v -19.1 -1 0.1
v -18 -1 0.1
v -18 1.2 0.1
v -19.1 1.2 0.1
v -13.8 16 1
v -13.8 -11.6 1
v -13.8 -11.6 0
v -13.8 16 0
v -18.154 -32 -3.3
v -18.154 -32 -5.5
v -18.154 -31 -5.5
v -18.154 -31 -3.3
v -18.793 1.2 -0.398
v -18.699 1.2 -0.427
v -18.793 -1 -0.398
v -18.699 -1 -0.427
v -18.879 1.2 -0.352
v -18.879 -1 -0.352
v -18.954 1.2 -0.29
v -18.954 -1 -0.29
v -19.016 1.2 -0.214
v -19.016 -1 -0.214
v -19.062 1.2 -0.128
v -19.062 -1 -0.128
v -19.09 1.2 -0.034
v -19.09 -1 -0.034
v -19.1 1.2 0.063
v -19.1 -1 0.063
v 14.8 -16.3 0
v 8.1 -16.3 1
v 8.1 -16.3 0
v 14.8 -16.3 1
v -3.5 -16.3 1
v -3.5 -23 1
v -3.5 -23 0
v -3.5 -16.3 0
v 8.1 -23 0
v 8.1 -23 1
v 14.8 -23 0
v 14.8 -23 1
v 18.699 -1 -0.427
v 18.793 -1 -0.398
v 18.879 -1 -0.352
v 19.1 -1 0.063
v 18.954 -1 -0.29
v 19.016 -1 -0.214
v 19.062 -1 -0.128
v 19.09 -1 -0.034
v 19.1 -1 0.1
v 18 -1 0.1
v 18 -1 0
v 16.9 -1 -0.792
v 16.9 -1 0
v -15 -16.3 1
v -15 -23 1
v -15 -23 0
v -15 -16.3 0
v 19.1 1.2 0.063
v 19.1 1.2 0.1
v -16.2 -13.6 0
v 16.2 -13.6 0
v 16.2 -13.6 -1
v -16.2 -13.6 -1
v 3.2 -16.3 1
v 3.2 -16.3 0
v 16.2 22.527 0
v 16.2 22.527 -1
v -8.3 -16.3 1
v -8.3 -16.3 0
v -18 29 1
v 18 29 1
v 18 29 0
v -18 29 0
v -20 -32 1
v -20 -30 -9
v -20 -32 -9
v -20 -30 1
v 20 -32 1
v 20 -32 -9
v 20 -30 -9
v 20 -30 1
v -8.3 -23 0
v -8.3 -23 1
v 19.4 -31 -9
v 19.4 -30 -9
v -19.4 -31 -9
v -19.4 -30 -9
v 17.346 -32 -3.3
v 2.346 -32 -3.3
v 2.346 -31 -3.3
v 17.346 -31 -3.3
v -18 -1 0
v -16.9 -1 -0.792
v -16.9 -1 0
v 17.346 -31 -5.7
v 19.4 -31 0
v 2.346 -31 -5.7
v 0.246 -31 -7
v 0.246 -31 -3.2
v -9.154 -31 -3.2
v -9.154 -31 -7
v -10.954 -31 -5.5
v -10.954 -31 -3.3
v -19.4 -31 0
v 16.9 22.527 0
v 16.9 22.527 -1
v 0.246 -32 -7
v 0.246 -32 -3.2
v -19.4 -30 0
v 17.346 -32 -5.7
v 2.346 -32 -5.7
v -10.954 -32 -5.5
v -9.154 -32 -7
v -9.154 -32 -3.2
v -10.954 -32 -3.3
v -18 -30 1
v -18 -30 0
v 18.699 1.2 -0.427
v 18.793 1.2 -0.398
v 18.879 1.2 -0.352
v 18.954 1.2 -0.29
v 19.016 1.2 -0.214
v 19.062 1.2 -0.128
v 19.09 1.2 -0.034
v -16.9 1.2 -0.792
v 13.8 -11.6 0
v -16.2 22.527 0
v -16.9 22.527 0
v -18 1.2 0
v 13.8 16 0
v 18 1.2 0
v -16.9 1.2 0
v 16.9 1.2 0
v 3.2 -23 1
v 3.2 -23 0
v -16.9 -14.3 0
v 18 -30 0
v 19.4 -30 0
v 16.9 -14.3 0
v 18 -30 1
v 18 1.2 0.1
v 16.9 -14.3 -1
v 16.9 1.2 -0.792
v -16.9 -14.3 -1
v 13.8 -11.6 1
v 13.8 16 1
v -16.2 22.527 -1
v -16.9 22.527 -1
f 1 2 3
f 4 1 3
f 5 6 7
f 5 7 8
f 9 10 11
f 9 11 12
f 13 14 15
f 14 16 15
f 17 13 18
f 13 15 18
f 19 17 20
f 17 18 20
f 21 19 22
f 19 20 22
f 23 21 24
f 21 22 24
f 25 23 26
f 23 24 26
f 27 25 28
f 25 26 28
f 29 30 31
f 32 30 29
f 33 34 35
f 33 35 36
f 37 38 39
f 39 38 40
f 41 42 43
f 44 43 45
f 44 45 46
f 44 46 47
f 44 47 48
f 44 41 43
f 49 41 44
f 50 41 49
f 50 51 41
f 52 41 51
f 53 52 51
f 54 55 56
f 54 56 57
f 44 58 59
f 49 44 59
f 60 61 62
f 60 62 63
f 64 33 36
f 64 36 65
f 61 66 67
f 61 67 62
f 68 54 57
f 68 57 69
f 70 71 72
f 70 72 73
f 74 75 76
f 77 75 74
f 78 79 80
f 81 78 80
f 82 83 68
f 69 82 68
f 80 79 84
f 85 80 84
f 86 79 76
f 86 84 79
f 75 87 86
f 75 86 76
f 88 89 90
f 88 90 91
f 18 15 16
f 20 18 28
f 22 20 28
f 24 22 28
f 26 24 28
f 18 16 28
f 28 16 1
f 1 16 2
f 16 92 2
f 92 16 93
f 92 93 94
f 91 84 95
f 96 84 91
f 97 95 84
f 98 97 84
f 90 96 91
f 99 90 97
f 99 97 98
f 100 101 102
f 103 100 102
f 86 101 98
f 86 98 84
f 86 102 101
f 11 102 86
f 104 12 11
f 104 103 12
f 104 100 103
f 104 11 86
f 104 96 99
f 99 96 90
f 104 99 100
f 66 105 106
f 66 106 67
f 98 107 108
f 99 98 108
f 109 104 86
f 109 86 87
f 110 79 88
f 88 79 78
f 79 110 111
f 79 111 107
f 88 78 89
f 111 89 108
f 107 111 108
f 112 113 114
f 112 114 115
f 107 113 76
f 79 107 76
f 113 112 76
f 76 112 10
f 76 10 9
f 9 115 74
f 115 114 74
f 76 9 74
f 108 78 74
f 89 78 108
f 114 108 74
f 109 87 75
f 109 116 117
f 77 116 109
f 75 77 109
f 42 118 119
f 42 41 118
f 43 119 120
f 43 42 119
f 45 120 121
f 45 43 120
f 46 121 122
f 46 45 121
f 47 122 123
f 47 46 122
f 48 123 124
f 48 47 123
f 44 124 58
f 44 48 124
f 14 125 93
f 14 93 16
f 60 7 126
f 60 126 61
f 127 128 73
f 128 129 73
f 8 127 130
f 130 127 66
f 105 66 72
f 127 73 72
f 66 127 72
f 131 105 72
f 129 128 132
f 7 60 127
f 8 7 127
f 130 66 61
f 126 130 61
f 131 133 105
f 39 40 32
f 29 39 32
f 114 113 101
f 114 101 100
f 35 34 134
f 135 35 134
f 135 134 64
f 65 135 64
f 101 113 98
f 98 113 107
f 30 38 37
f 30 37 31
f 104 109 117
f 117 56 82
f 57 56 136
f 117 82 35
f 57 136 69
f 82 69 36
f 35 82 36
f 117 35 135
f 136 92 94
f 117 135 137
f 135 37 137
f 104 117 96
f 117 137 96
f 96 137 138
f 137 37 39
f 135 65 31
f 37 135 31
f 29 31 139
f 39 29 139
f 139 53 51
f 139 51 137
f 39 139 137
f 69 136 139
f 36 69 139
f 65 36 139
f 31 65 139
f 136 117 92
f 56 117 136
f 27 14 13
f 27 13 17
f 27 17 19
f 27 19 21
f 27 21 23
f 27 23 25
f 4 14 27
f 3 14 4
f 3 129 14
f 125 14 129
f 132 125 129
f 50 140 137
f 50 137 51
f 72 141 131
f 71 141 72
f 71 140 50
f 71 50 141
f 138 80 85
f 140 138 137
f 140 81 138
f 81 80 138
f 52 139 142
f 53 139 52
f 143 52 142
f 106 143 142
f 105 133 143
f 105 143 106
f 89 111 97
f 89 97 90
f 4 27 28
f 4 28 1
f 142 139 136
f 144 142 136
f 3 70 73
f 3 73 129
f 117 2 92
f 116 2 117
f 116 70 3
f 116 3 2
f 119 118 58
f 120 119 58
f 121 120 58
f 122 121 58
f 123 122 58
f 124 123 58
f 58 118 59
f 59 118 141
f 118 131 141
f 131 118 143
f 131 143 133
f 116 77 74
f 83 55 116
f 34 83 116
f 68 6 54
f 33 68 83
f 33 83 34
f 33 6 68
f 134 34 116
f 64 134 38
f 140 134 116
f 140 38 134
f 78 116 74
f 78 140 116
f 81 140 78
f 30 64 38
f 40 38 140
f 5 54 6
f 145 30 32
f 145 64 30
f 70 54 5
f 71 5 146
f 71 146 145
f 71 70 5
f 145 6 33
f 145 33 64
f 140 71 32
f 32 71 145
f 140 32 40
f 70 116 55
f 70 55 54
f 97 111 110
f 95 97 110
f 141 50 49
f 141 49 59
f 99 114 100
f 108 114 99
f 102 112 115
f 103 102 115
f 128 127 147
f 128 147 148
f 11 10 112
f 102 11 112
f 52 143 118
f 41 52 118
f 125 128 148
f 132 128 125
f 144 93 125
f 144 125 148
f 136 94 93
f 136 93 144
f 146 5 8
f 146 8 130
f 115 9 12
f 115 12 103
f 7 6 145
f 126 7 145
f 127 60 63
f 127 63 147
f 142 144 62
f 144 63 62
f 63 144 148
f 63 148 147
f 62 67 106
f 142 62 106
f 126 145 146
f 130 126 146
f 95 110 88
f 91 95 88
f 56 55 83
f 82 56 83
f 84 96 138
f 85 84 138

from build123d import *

# Parameters (mm, degrees)
SKETCH_1_W             = 40
SKETCH_1_H             = 62
EXTRUDE_1_DEPTH        = 1
SKETCH_3_W             = 27.6
SKETCH_3_H             = 27.6
SKETCH_3_W_2           = 6.7
SKETCH_3_H_2           = 6.7
CUT_EXTRUDE_1_DEPTH    = 37.905284174
EXTRUDE_2_DEPTH        = 1
SKETCH_8_W             = 40
SKETCH_8_H             = 1
EXTRUDE_5_DEPTH        = 1
SKETCH_10_W            = 0.6
SKETCH_10_H            = 2
EXTRUDE_6_DEPTH        = 9
SKETCH_11_W            = 38.8
SKETCH_11_H            = 1
EXTRUDE_7_DEPTH        = 9
CUT_EXTRUDE_2_REACH    = 68.708
SKETCH_13_W            = 7.2
SKETCH_13_H            = 2.2
SKETCH_13_W_2          = 9.4
SKETCH_13_H_2          = 3.8
SKETCH_13_W_3          = 15
SKETCH_13_H_3          = 2.4
CUT_EXTRUDE_3_DEPTH    = 10
SKETCH_15_W            = 0.891909811
SKETCH_15_H            = 2.2
EXTRUDE_8_DEPTH        = 2.2
CUT_EXTRUDE_4_REACH    = 41.79
FILLET_1_R             = 0.5
FILLET_1_OF_MIRROR_1_R = 0.5


with BuildPart() as part:
    # 草图1 → 凸台-拉伸1 (new body)
    with BuildSketch(Plane.XY):
        Rectangle(SKETCH_1_W, SKETCH_1_H)
    extrude(amount=EXTRUDE_1_DEPTH)

    # 草图3 → 切除-拉伸1 (cut, through all)
    with BuildSketch(Plane.XY.offset(1)):
        with Locations((0, 2.2)):
            Rectangle(SKETCH_3_W, SKETCH_3_H)
        with Locations((-11.65, -19.65)):
            Rectangle(SKETCH_3_W_2, SKETCH_3_H_2)
        with Locations((-0.15, -19.65)):
            Rectangle(SKETCH_3_W_2, SKETCH_3_H_2)
        with Locations((11.45, -19.65)):
            Rectangle(SKETCH_3_W_2, SKETCH_3_H_2)
    extrude(amount=-CUT_EXTRUDE_1_DEPTH, mode=Mode.SUBTRACT)

    # 草图4 → 凸台-拉伸2 (add)
    with BuildSketch(Plane(origin=(0, 0, 0), x_dir=(-1, 0, 0), z_dir=(0, 0, -1))):
        Polygon((-16.9, 22.527428343), (-16.2, 22.527428343), (-16.2, -13.6), (16.2, -13.6), (16.2, 22.527428343), (16.9, 22.527428343), (16.9, -14.3), (15.9, -14.3), (-15.9, -14.3), (-16.9, -14.3), align=None)
    extrude(amount=EXTRUDE_2_DEPTH)

    # 草图8 → 凸台-拉伸5 (add)
    with BuildSketch(Plane.XZ.offset(31)):
        with Locations((0, 0.5)):
            Rectangle(SKETCH_8_W, SKETCH_8_H)
    extrude(amount=EXTRUDE_5_DEPTH)

    # 草图10 → 凸台-拉伸6 (add)
    with BuildSketch(Plane(origin=(0, 0, 0), x_dir=(-1, 0, 0), z_dir=(0, 0, -1))):
        with Locations((-19.7, -31)):
            Rectangle(SKETCH_10_W, SKETCH_10_H)
        with Locations((19.7, -31)):
            Rectangle(SKETCH_10_W, SKETCH_10_H)
    extrude(amount=EXTRUDE_6_DEPTH)

    # 草图11 → 凸台-拉伸7 (add)
    with BuildSketch(Plane(origin=(0, 0, 0), x_dir=(-1, 0, 0), z_dir=(0, 0, -1))):
        with Locations((0, -31.5)):
            Rectangle(SKETCH_11_W, SKETCH_11_H)
    extrude(amount=EXTRUDE_7_DEPTH)

    # 草图13 → 切除-拉伸2 (cut, up to next)
    with BuildSketch(Plane.XZ.offset(32), mode=Mode.PRIVATE) as cut_extrude_2_sk1:
        with Locations((-14.554254311, -4.4)):
            Rectangle(SKETCH_13_W, SKETCH_13_H)
    cut_extrude_2_tool1 = extrude(cut_extrude_2_sk1.sketch, amount=-CUT_EXTRUDE_2_REACH, mode=Mode.PRIVATE) & part.part
    # 草图13 → 切除-拉伸2 (cut, up to next)
    with BuildSketch(Plane.XZ.offset(32), mode=Mode.PRIVATE) as cut_extrude_2_sk2:
        with Locations((-4.454254311, -5.1)):
            Rectangle(SKETCH_13_W_2, SKETCH_13_H_2)
    cut_extrude_2_tool2 = extrude(cut_extrude_2_sk2.sketch, amount=-CUT_EXTRUDE_2_REACH, mode=Mode.PRIVATE) & part.part
    # 草图13 → 切除-拉伸2 (cut, up to next)
    with BuildSketch(Plane.XZ.offset(32), mode=Mode.PRIVATE) as cut_extrude_2_sk3:
        with Locations((9.845745689, -4.5)):
            Rectangle(SKETCH_13_W_3, SKETCH_13_H_3)
    cut_extrude_2_tool3 = extrude(cut_extrude_2_sk3.sketch, amount=-CUT_EXTRUDE_2_REACH, mode=Mode.PRIVATE) & part.part
    add(cut_extrude_2_tool1.solids().sort_by_distance((-14.554254, -32, -4.4))[0], mode=Mode.SUBTRACT)
    add(cut_extrude_2_tool2.solids().sort_by_distance((-4.454254, -32, -5.1))[0], mode=Mode.SUBTRACT)
    add(cut_extrude_2_tool3.solids().sort_by_distance((9.845746, -32, -4.5))[0], mode=Mode.SUBTRACT)

    # 草图14 → 切除-拉伸3 (cut)
    with BuildSketch(Plane.XY.offset(1)):
        Polygon((-20, 31), (-18, 31), (18, 31), (20, 31), (20, -30), (18, -30), (18, 29), (-18, 29), (-18, -30), (-20, -30), align=None)
    extrude(amount=-CUT_EXTRUDE_3_DEPTH, mode=Mode.SUBTRACT)

    # 草图15 → 凸台-拉伸8 (add)
    with BuildSketch(Plane.ZY.offset(16.9)):
        with Locations((-0.345954906, 0.1)):
            Rectangle(SKETCH_15_W, SKETCH_15_H)
    extrude_8 = extrude(amount=EXTRUDE_8_DEPTH)

    # 草图16 → 切除-拉伸4 (cut, up to next)
    with BuildSketch(Plane(origin=(0, 1.2, 0), x_dir=(1, 0, 0), z_dir=(0, 1, 0)), mode=Mode.PRIVATE) as cut_extrude_4_sk1:
        Polygon((-16.9, 0.791909811), (-19.1, 0.345954906), (-19.1, 0.791909811), align=None)
    cut_extrude_4_tool1 = extrude(cut_extrude_4_sk1.sketch, amount=-CUT_EXTRUDE_4_REACH, mode=Mode.PRIVATE) & part.part
    cut_extrude_4 = cut_extrude_4_tool1.solids().sort_by_distance((-18.366667, 1.2, -0.643258))[0]
    add(cut_extrude_4, mode=Mode.SUBTRACT)

    # 圆角1
    fillet_1_edges = [part.edges().sort_by_distance(p)[0] for p in [
        (-19.1, 0.1, -0.345954906),
    ]]
    fillet(fillet_1_edges, radius=FILLET_1_R)

    # 镜向1: 凸台-拉伸8, 切除-拉伸4 across plane
    add(extrude_8.mirror(Plane(origin=(0, 0, 0), x_dir=(0, 0, 1), z_dir=(1, 0, 0))))
    add(cut_extrude_4.mirror(Plane(origin=(0, 0, 0), x_dir=(0, 0, 1), z_dir=(1, 0, 0))), mode=Mode.SUBTRACT)

    # 圆角1 of 镜向1
    fillet_1_of_mirror_1_edges = [part.edges().sort_by_distance(p)[0] for p in [
        (19.1, 0.1, -0.345954906),
    ]]
    fillet(fillet_1_of_mirror_1_edges, radius=FILLET_1_OF_MIRROR_1_R)


solid = part.part
